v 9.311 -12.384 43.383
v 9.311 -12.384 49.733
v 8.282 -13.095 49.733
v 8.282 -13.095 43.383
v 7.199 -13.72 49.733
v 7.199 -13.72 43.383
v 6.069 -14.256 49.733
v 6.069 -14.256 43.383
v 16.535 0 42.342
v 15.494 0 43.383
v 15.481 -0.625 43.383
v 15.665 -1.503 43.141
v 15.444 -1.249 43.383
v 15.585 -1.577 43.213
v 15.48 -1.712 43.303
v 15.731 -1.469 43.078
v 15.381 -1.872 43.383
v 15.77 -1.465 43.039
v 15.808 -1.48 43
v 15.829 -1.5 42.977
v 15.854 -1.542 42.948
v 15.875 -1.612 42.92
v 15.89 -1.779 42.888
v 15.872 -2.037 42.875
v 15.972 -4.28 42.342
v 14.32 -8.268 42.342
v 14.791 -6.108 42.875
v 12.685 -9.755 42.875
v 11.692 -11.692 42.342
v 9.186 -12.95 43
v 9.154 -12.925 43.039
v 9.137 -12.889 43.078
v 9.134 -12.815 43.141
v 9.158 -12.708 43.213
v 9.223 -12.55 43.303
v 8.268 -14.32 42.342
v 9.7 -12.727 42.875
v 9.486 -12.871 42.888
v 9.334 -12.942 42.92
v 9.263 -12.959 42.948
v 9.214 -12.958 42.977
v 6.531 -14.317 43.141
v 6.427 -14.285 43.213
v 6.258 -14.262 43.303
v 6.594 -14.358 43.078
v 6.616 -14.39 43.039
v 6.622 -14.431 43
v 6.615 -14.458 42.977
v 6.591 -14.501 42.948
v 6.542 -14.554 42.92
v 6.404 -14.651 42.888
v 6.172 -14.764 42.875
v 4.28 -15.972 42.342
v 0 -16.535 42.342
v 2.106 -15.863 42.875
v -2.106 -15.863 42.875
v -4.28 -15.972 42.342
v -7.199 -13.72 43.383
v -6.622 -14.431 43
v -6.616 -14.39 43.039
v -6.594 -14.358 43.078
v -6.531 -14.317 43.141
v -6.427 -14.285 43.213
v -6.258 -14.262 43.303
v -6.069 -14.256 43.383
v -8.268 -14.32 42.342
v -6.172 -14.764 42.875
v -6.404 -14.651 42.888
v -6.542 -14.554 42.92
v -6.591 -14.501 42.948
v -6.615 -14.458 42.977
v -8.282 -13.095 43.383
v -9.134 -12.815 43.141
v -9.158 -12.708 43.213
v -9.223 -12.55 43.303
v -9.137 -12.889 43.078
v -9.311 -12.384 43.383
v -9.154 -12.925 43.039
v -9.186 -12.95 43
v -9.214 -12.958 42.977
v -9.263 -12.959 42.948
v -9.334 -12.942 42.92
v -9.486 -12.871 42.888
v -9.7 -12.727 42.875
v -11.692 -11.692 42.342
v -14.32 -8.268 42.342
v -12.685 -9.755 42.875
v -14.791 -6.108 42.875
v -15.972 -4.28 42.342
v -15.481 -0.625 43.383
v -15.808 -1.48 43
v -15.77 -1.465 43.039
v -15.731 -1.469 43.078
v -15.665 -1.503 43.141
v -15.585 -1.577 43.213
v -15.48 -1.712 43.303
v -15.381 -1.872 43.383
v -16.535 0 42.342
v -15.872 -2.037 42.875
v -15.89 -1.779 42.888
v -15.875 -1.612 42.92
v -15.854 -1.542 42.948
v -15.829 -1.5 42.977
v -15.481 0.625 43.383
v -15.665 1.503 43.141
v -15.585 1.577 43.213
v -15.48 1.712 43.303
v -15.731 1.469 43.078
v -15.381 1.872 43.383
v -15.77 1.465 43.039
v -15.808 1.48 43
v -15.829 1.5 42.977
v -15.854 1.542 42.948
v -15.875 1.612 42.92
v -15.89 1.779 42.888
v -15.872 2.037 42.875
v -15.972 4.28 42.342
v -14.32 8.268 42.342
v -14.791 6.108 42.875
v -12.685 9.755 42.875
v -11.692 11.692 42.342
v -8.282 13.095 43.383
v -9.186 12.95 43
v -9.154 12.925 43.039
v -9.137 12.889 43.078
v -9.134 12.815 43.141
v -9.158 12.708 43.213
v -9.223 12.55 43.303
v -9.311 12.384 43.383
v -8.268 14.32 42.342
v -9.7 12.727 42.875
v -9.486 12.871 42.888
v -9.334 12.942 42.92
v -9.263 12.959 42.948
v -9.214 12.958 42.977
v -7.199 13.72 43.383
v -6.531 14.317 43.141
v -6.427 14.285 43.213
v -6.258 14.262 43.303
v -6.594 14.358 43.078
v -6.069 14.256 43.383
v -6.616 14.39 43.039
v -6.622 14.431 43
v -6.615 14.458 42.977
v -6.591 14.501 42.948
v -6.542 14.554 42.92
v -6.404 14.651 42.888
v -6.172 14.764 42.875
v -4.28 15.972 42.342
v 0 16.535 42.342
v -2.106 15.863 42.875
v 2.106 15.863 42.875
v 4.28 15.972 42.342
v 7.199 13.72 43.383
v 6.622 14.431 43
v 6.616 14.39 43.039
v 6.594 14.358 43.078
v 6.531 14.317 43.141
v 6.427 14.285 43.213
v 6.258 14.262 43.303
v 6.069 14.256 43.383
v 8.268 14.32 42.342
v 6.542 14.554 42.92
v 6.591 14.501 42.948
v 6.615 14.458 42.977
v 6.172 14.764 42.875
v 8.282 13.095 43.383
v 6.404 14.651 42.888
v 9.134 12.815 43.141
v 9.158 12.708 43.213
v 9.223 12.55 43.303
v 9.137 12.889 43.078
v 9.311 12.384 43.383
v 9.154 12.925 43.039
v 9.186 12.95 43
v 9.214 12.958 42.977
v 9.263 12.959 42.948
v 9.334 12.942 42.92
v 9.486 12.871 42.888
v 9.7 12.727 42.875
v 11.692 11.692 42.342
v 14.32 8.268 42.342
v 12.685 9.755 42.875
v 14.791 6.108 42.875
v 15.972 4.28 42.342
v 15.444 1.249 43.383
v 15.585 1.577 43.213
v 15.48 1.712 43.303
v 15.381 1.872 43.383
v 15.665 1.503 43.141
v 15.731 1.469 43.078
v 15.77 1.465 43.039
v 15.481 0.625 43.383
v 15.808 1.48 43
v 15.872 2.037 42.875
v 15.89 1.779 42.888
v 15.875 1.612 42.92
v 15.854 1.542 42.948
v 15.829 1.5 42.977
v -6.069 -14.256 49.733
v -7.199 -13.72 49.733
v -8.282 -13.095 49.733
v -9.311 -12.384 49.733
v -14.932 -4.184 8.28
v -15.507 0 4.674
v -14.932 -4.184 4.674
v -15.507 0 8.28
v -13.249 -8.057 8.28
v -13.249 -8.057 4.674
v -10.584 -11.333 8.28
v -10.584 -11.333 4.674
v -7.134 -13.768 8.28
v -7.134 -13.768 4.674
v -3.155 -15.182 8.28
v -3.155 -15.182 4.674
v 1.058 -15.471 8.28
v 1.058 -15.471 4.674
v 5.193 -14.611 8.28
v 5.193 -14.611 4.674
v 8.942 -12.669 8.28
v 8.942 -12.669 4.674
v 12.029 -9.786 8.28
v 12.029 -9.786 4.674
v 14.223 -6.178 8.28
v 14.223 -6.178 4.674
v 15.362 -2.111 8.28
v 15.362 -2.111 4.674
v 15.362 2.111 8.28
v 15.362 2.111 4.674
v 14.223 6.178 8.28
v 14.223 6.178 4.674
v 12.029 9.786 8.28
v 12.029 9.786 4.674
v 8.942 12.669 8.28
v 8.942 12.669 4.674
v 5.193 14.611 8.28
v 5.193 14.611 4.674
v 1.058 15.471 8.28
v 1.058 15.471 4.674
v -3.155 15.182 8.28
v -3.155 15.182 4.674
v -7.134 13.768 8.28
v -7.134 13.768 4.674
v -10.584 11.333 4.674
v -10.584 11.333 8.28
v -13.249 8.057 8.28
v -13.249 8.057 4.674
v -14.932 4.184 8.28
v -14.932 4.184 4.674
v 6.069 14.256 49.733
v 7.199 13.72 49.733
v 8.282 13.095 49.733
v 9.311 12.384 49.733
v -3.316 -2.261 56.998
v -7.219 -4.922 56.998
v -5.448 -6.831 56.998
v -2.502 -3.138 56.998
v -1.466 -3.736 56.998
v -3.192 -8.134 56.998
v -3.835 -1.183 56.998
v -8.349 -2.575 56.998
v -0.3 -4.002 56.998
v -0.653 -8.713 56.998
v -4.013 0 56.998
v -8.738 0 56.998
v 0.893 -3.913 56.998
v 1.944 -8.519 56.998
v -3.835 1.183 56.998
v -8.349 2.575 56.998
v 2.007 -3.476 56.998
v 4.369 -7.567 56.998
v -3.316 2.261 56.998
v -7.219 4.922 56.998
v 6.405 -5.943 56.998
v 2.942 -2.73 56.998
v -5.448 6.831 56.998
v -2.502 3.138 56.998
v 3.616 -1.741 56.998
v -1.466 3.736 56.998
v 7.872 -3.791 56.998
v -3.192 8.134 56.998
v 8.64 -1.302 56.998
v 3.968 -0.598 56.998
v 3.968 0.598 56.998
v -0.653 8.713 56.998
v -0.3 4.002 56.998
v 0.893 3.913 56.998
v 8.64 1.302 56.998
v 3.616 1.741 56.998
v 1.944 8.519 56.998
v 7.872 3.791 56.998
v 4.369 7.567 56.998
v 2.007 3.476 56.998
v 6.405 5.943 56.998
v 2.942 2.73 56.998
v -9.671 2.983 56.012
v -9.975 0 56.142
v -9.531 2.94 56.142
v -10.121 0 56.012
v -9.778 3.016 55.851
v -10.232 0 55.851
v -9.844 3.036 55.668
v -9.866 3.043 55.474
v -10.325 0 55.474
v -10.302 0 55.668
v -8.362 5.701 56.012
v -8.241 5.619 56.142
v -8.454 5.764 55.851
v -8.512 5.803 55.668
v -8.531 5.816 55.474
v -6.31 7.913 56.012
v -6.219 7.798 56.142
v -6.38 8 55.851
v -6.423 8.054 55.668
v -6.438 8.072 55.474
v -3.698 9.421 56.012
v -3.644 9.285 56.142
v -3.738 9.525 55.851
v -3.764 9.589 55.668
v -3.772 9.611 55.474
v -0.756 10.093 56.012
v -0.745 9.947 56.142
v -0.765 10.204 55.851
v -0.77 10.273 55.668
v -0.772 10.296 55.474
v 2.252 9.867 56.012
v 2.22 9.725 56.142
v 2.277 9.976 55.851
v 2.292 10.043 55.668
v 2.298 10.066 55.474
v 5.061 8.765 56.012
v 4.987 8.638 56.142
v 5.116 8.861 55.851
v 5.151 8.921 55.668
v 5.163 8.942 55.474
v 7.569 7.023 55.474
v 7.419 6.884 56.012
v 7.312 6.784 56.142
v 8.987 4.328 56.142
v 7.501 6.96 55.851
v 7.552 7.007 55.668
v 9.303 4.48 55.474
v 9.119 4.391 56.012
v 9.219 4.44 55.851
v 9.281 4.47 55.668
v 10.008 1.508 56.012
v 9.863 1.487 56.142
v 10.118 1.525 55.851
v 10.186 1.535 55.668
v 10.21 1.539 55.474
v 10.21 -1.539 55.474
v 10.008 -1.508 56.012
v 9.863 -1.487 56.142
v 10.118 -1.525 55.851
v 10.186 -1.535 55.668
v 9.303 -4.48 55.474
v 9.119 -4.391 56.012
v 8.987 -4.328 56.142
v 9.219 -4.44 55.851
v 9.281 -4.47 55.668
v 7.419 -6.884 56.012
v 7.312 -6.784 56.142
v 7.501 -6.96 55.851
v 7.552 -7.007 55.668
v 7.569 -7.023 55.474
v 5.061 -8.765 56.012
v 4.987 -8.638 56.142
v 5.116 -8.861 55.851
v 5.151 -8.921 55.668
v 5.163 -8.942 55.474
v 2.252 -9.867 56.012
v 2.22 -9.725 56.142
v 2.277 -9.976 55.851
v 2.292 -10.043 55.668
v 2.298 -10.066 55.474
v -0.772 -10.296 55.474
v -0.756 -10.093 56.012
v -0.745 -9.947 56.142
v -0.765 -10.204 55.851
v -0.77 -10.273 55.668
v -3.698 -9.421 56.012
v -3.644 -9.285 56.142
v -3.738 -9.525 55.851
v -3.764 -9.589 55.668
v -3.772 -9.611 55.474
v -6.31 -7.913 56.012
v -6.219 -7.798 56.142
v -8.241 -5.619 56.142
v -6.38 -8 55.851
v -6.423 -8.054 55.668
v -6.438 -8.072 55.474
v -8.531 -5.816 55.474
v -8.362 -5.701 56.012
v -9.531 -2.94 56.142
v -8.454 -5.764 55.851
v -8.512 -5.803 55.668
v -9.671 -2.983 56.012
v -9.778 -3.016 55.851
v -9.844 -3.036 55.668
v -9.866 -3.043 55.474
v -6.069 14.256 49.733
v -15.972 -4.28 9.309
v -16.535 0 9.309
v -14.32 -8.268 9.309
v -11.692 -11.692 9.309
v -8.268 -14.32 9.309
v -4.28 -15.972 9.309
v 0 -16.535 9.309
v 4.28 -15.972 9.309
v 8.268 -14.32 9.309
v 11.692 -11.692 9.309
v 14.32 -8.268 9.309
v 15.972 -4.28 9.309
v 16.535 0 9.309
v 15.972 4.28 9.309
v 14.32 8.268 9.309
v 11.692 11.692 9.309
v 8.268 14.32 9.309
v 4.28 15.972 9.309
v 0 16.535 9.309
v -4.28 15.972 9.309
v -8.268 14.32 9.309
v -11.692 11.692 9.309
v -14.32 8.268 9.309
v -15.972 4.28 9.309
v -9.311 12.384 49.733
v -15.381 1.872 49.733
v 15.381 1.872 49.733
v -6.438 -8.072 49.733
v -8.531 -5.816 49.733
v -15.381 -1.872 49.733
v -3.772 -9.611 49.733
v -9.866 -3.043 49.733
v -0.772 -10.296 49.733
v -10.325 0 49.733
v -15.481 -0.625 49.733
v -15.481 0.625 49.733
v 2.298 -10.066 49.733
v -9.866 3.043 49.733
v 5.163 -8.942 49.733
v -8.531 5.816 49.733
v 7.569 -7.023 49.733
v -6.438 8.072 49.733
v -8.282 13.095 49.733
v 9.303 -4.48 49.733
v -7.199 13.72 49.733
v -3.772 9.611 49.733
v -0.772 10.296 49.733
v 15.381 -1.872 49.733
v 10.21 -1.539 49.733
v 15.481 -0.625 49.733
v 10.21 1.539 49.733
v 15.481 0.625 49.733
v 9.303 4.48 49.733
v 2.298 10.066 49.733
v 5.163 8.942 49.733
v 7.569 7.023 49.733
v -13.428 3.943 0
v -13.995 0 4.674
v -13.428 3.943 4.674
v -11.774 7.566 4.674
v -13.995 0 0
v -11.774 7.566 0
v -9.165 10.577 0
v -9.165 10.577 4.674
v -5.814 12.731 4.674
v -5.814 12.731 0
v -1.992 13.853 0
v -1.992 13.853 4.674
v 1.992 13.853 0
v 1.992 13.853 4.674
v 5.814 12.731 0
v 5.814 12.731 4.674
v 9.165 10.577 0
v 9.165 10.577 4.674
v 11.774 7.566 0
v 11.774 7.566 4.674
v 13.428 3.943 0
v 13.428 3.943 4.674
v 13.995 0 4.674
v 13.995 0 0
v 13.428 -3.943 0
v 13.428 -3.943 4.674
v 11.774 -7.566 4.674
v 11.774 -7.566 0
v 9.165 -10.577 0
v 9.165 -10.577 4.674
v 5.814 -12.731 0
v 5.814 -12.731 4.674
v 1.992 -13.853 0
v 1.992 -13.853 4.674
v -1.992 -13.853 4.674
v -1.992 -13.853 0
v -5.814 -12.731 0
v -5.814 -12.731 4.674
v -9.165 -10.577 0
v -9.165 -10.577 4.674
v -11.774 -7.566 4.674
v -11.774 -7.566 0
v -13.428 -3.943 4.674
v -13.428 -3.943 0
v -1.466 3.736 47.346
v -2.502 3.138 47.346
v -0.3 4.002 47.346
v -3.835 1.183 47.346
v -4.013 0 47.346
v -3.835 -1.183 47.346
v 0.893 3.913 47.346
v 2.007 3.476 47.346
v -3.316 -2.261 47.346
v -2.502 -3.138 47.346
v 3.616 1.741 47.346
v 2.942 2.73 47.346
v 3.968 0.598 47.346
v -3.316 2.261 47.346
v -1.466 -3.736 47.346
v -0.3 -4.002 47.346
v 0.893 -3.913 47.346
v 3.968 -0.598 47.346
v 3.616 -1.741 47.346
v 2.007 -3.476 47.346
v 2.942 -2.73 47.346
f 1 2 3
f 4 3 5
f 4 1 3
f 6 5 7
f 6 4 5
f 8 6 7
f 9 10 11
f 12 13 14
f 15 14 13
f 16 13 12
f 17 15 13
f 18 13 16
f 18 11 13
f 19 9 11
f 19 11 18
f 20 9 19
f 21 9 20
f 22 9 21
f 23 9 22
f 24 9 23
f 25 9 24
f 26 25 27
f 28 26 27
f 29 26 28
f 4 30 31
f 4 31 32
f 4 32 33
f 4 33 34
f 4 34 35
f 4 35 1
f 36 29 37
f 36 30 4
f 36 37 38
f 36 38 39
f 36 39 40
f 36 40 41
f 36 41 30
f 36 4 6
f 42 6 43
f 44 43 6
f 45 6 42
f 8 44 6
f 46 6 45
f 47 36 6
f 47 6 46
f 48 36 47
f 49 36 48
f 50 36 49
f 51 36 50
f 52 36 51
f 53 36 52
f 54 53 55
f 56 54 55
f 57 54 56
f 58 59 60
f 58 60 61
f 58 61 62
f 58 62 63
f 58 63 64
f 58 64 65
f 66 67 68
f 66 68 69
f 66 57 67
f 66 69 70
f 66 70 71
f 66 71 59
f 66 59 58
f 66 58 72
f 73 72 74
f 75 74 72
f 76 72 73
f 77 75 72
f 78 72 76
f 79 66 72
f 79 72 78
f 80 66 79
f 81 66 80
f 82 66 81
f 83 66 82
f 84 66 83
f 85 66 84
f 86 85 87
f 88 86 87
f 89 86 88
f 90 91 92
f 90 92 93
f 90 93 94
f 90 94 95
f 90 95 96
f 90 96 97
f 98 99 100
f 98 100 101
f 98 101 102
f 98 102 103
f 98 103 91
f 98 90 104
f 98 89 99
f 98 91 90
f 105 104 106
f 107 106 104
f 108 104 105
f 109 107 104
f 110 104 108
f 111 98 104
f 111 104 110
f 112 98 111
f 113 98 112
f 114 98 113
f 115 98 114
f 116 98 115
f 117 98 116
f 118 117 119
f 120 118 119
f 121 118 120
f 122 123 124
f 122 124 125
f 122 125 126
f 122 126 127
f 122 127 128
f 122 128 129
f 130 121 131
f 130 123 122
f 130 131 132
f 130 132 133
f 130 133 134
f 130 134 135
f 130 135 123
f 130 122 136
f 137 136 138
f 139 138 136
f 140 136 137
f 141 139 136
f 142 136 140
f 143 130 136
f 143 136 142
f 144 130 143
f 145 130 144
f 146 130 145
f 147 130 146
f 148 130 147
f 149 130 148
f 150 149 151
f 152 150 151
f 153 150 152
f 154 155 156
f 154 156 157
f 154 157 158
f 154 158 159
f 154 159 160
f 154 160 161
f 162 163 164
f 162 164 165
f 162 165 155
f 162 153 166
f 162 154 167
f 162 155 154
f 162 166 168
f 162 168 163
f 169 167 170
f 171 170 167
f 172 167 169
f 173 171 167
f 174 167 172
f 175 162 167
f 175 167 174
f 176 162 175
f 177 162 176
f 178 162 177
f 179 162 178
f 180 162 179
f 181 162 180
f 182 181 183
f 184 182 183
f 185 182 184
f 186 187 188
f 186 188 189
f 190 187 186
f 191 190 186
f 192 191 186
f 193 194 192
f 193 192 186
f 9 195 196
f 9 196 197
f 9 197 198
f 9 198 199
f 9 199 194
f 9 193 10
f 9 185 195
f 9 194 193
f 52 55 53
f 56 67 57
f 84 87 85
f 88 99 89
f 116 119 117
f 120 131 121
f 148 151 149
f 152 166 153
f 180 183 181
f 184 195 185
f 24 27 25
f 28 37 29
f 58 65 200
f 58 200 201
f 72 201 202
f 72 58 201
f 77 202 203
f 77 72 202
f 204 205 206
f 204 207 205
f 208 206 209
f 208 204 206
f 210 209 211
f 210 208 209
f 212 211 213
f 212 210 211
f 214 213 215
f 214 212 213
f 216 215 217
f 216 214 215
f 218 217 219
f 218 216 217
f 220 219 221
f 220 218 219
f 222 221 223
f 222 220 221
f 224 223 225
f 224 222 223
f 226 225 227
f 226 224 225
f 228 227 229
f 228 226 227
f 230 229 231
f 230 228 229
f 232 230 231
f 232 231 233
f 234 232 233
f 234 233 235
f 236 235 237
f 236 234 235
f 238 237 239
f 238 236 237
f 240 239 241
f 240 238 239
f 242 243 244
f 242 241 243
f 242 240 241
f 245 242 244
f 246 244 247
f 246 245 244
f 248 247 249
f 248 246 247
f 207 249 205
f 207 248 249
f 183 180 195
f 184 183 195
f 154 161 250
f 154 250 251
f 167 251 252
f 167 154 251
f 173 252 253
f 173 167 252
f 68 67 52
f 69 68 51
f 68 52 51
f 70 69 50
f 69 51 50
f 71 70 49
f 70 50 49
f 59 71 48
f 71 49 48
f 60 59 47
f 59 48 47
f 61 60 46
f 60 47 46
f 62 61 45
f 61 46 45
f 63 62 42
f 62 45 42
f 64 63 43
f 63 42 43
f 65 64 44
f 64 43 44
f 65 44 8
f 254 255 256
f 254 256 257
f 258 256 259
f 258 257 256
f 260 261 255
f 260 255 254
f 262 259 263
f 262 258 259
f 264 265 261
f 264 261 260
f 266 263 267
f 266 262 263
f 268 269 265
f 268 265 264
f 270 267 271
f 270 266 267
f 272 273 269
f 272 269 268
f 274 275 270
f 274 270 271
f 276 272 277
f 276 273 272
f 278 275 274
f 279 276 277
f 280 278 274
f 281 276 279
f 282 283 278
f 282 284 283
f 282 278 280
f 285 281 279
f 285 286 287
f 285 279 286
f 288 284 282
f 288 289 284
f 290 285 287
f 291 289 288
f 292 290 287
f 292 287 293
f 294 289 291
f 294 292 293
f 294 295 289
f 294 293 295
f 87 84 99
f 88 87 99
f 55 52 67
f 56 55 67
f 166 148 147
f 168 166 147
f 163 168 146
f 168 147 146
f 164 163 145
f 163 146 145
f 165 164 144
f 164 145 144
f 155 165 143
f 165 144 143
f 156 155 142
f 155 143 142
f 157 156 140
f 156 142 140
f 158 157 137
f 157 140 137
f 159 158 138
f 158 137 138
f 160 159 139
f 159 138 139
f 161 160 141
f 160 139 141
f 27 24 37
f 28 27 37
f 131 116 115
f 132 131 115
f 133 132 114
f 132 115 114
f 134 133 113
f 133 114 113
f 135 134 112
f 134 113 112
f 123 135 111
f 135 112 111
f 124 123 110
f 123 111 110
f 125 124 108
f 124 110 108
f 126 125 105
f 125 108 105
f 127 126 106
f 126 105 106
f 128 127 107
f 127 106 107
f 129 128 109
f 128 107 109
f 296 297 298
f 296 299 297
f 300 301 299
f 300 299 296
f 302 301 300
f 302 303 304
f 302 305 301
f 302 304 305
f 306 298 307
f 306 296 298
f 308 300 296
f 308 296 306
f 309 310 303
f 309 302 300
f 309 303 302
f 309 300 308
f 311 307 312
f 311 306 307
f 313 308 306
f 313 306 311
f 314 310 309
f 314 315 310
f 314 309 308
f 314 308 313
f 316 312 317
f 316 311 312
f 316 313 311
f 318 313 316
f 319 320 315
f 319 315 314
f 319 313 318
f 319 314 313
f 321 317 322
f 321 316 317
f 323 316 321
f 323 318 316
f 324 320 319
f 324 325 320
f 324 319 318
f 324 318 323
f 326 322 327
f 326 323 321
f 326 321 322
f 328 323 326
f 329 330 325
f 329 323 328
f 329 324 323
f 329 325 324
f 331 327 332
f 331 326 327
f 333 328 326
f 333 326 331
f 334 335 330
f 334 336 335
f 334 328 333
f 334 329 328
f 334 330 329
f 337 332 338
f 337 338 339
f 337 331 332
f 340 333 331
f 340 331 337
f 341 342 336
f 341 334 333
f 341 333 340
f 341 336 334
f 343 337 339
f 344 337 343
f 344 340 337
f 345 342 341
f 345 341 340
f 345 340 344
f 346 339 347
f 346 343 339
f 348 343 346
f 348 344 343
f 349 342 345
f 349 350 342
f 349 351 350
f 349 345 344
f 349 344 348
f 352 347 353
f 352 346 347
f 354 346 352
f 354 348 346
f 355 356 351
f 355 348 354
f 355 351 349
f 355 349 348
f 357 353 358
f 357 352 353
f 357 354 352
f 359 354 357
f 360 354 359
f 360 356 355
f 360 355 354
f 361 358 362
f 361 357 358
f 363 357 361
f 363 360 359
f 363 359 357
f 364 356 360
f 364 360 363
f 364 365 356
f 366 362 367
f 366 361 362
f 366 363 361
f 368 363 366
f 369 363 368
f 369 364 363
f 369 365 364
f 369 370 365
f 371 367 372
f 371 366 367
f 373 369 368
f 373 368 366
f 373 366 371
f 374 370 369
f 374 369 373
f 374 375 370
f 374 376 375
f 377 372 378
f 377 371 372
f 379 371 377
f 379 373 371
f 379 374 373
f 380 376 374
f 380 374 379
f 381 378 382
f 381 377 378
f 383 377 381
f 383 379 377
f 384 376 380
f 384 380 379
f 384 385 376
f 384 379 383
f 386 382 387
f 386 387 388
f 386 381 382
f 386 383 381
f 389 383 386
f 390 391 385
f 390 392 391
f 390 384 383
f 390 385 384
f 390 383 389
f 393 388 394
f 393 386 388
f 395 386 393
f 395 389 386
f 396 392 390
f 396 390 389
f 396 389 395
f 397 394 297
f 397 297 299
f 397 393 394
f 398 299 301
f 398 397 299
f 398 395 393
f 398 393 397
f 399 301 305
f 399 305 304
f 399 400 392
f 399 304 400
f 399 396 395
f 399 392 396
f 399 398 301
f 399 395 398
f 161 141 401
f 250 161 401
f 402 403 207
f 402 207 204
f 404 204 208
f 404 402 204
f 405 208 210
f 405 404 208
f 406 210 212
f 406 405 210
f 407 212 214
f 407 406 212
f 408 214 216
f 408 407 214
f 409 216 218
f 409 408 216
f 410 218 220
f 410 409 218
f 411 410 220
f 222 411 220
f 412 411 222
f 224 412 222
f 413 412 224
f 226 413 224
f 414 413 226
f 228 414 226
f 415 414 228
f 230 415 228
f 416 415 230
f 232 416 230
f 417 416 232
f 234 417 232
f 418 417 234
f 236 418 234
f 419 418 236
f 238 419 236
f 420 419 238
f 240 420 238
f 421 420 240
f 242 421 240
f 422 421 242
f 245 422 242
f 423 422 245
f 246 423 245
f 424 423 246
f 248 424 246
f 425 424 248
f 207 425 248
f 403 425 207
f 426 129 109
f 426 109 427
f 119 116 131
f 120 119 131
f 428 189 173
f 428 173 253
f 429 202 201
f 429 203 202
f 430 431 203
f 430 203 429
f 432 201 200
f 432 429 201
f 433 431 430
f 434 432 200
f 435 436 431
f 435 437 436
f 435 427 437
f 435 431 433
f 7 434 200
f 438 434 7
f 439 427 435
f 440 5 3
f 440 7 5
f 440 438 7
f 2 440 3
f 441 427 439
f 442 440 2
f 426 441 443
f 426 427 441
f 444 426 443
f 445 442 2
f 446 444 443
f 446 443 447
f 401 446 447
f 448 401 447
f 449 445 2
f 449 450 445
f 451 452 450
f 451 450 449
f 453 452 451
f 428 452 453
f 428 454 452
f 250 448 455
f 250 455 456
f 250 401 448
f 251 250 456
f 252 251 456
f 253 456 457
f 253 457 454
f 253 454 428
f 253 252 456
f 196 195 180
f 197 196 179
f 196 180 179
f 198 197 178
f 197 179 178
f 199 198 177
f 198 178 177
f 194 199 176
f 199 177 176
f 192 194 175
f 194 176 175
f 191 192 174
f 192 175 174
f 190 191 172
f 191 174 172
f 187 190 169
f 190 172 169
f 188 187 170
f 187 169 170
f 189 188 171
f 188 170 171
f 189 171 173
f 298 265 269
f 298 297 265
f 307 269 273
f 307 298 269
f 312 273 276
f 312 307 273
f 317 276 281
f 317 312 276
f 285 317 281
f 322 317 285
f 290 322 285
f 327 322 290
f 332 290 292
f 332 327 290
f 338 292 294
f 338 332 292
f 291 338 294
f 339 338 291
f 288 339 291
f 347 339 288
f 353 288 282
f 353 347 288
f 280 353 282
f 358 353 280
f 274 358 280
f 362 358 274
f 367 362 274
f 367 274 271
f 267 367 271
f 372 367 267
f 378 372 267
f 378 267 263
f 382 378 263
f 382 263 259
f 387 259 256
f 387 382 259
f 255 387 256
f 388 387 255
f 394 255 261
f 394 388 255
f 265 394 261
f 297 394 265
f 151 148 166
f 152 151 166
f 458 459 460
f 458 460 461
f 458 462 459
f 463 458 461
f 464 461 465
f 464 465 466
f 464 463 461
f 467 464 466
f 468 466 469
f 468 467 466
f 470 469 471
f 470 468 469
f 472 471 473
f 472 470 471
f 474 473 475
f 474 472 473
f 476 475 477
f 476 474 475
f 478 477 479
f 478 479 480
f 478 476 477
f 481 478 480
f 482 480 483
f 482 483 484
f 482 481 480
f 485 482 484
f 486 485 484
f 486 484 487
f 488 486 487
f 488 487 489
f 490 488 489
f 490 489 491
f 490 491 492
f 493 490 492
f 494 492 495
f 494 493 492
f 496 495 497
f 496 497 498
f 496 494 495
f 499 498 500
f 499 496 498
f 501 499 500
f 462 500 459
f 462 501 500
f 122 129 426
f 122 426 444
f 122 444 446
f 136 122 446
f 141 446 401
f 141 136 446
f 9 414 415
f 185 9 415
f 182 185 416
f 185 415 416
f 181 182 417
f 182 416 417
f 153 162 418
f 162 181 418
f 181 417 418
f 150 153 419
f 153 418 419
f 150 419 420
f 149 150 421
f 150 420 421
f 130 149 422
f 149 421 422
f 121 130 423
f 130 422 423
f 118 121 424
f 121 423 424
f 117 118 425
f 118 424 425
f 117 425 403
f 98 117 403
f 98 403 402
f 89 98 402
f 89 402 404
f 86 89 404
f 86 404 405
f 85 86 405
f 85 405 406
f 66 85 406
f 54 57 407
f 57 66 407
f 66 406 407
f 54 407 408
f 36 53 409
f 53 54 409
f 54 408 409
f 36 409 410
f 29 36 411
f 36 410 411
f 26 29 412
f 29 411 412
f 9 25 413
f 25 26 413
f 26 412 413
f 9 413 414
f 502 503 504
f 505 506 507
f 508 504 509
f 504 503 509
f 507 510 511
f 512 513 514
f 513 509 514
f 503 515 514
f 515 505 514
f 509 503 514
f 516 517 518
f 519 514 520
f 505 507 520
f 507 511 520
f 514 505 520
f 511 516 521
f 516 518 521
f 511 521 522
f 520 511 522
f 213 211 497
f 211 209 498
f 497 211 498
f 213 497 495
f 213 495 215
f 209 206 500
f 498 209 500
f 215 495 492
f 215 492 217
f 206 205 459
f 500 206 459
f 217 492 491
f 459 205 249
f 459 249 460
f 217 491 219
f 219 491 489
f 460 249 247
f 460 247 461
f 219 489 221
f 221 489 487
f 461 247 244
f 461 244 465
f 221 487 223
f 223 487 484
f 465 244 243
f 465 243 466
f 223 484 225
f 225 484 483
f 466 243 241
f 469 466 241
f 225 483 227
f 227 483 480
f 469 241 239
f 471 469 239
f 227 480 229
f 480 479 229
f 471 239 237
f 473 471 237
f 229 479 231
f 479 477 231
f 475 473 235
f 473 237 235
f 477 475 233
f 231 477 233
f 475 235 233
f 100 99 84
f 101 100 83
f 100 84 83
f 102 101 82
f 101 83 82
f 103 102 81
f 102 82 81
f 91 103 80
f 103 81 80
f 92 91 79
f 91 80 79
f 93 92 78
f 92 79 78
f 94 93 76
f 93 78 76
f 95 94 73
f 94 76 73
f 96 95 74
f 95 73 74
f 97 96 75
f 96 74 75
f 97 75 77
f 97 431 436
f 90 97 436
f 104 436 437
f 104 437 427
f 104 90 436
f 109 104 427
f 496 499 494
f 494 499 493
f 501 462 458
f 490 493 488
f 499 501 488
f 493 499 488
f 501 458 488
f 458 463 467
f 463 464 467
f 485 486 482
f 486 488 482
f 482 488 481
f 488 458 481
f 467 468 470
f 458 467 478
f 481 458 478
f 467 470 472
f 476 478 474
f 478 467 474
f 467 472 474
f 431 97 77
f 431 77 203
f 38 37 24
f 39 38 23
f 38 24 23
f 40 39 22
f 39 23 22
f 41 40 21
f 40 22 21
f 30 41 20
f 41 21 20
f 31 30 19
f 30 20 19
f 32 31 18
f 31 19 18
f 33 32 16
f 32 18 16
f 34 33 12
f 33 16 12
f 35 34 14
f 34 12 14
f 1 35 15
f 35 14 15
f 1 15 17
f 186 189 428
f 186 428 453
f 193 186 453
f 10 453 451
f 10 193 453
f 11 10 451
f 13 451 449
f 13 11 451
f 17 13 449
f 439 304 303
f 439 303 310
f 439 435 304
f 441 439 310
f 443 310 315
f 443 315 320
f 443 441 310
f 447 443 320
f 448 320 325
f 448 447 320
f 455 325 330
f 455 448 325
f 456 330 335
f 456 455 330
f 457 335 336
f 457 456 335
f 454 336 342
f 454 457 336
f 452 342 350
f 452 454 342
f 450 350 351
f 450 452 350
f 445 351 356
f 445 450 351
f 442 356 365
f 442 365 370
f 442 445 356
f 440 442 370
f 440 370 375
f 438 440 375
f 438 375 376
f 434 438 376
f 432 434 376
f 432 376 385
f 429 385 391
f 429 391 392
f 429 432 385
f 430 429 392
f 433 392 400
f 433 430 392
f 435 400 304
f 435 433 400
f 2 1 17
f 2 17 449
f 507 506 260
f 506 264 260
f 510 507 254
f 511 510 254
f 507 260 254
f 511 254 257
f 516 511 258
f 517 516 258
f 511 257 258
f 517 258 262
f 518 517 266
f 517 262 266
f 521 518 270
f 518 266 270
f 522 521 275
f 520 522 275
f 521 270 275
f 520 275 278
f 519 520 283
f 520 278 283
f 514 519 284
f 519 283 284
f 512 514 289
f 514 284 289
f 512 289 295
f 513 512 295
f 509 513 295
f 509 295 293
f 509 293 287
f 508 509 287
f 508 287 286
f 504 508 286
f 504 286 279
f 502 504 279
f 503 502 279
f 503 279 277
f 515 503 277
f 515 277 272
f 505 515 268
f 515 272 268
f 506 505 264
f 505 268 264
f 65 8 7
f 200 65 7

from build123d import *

# Parameters (mm, degrees)
SKETCH1_R          = 16.5354
EXTRUDE1_DEPTH     = 49.7332
CUT_EXTRUDE1_DEPTH = 19.84248
SKETCH12_W         = 4.6736
SKETCH12_H         = 1.5113
SKETCH13_W         = 7.2644
SKETCH13_H         = 10.3251
S2D0011_W          = 4.0132
S2D0011_H          = 9.652
CIRPATTERN2_COUNT  = 6


with BuildPart() as part:
    # Sketch1 → Extrude1 (new body)
    with BuildSketch(Plane.XY):
        Circle(SKETCH1_R)
    extrude(amount=EXTRUDE1_DEPTH)

    # Sketch2 → Cut-Extrude1 (cut, symmetric)
    with BuildSketch(Plane(origin=(0, 0, 0), x_dir=(0, 0, 1), z_dir=(1, 0, 0))):
        with BuildLine():
            Line((42.8752, 16.5354), (42.8752, 14.76375))
            ThreePointArc((42.8752, 14.76375), (43.023989755, 14.404539755), (43.3832, 14.25575))
            Line((43.3832, 14.25575), (49.7332, 14.25575))
            Line((49.7332, 14.25575), (49.7332, 16.5354))
            Line((49.7332, 16.5354), (42.8752, 16.5354))
        make_face()
    cut_extrude1 = extrude(amount=CUT_EXTRUDE1_DEPTH, both=True, mode=Mode.SUBTRACT)

    # Sketch10 → Cut-Revolve1 (revolve, cut)
    with BuildSketch(Plane(origin=(0, 0, 0), x_dir=(0, 0, -1), z_dir=(1, 0, 0)), mode=Mode.PRIVATE) as cut_revolve1_sk:
        Polygon((-49.7332, 15.494), (-43.3832, 15.494), (-42.3418, 16.5354), (-49.7332, 16.5354), align=None)
    revolve(cut_revolve1_sk.sketch.rotate(Axis((0, 0, 50.10277), (0, 0, -1)), 90), axis=Axis((0, 0, 50.10277), (0, 0, -1)), mode=Mode.SUBTRACT)  # turned: the seam where the file's is

    # Sketch11 → Cut-Revolve2 (revolve, cut)
    with BuildSketch(Plane(origin=(0, 0, 0), x_dir=(0, 0, 1), z_dir=(1, 0, 0)), mode=Mode.PRIVATE) as cut_revolve2_sk:
        Polygon((0, 15.5067), (8.2804, 15.5067), (9.3091, 16.5354), (0, 16.5354), align=None)
    revolve(cut_revolve2_sk.sketch.rotate(Axis((0, 0, -0.465455), (0, 0, 1)), 270), axis=Axis((0, 0, -0.465455), (0, 0, 1)), mode=Mode.SUBTRACT)  # turned: the seam where the file's is

    # Sketch12 → Cut-Revolve3 (revolve, cut)
    with BuildSketch(Plane(origin=(0, 0, 0), x_dir=(0, 0, -1), z_dir=(1, 0, 0)), mode=Mode.PRIVATE) as cut_revolve3_sk:
        with Locations((-2.3368, 14.75105)):
            Rectangle(SKETCH12_W, SKETCH12_H)
    revolve(cut_revolve3_sk.sketch.rotate(Axis((0, 0, 4.90728), (0, 0, -1)), 270), axis=Axis((0, 0, 4.90728), (0, 0, -1)), mode=Mode.SUBTRACT)  # turned: the seam where the file's is

    # Sketch13 → Revolve1 (revolve)
    with BuildSketch(Plane(origin=(0, 0, 0), x_dir=(0, 0, -1), z_dir=(1, 0, 0)), mode=Mode.PRIVATE) as revolve1_sk:
        with Locations((-53.3654, 5.16255)):
            Rectangle(SKETCH13_W, SKETCH13_H)
    revolve(revolve1_sk.sketch.rotate(Axis((0, 0, 57.36082), (0, 0, -1)), 270), axis=Axis((0, 0, 57.36082), (0, 0, -1)))  # turned: the seam where the file's is

    # S2D0011 → Cut-Revolve4 (revolve, cut)
    with BuildSketch(Plane(origin=(-4.0132, 0, 56.9976), x_dir=(-1, 0, 0), z_dir=(0, 1, 0))):
        with Locations((-2.0066, -4.826)):
            Rectangle(S2D0011_W, S2D0011_H)
    revolve(axis=Axis((0, 0, 32.002650052), (0, 0, 1)), mode=Mode.SUBTRACT)

    # Sketch15 → Cut-Revolve5 (revolve, cut)
    with BuildSketch(Plane(origin=(0, 0, 0), x_dir=(0, 0, -1), z_dir=(1, 0, 0)), mode=Mode.PRIVATE) as cut_revolve5_sk:
        with BuildLine():
            Line((-56.9976, 8.7376), (-56.142107199, 9.97462236))
            ThreePointArc((-56.142107199, 9.97462236), (-55.851004442, 10.232167854), (-55.4736, 10.3251))
            Line((-55.4736, 10.3251), (-56.9976, 10.3251))
            Line((-56.9976, 10.3251), (-56.9976, 8.7376))
        make_face()
    revolve(cut_revolve5_sk.sketch.rotate(Axis((0, 0, 57.0738), (0, 0, -1)), 270), axis=Axis((0, 0, 57.0738), (0, 0, -1)), mode=Mode.SUBTRACT)  # turned: the seam where the file's is

    # CirPattern2: Cut-Extrude1 ×6 about axis
    cirpattern2_axis = Axis((0, 0, 0), (0, 0, 1))
    for i in range(1, CIRPATTERN2_COUNT):
        add(cut_extrude1.rotate(cirpattern2_axis, i * 360 / CIRPATTERN2_COUNT), mode=Mode.SUBTRACT)


solid = part.part
